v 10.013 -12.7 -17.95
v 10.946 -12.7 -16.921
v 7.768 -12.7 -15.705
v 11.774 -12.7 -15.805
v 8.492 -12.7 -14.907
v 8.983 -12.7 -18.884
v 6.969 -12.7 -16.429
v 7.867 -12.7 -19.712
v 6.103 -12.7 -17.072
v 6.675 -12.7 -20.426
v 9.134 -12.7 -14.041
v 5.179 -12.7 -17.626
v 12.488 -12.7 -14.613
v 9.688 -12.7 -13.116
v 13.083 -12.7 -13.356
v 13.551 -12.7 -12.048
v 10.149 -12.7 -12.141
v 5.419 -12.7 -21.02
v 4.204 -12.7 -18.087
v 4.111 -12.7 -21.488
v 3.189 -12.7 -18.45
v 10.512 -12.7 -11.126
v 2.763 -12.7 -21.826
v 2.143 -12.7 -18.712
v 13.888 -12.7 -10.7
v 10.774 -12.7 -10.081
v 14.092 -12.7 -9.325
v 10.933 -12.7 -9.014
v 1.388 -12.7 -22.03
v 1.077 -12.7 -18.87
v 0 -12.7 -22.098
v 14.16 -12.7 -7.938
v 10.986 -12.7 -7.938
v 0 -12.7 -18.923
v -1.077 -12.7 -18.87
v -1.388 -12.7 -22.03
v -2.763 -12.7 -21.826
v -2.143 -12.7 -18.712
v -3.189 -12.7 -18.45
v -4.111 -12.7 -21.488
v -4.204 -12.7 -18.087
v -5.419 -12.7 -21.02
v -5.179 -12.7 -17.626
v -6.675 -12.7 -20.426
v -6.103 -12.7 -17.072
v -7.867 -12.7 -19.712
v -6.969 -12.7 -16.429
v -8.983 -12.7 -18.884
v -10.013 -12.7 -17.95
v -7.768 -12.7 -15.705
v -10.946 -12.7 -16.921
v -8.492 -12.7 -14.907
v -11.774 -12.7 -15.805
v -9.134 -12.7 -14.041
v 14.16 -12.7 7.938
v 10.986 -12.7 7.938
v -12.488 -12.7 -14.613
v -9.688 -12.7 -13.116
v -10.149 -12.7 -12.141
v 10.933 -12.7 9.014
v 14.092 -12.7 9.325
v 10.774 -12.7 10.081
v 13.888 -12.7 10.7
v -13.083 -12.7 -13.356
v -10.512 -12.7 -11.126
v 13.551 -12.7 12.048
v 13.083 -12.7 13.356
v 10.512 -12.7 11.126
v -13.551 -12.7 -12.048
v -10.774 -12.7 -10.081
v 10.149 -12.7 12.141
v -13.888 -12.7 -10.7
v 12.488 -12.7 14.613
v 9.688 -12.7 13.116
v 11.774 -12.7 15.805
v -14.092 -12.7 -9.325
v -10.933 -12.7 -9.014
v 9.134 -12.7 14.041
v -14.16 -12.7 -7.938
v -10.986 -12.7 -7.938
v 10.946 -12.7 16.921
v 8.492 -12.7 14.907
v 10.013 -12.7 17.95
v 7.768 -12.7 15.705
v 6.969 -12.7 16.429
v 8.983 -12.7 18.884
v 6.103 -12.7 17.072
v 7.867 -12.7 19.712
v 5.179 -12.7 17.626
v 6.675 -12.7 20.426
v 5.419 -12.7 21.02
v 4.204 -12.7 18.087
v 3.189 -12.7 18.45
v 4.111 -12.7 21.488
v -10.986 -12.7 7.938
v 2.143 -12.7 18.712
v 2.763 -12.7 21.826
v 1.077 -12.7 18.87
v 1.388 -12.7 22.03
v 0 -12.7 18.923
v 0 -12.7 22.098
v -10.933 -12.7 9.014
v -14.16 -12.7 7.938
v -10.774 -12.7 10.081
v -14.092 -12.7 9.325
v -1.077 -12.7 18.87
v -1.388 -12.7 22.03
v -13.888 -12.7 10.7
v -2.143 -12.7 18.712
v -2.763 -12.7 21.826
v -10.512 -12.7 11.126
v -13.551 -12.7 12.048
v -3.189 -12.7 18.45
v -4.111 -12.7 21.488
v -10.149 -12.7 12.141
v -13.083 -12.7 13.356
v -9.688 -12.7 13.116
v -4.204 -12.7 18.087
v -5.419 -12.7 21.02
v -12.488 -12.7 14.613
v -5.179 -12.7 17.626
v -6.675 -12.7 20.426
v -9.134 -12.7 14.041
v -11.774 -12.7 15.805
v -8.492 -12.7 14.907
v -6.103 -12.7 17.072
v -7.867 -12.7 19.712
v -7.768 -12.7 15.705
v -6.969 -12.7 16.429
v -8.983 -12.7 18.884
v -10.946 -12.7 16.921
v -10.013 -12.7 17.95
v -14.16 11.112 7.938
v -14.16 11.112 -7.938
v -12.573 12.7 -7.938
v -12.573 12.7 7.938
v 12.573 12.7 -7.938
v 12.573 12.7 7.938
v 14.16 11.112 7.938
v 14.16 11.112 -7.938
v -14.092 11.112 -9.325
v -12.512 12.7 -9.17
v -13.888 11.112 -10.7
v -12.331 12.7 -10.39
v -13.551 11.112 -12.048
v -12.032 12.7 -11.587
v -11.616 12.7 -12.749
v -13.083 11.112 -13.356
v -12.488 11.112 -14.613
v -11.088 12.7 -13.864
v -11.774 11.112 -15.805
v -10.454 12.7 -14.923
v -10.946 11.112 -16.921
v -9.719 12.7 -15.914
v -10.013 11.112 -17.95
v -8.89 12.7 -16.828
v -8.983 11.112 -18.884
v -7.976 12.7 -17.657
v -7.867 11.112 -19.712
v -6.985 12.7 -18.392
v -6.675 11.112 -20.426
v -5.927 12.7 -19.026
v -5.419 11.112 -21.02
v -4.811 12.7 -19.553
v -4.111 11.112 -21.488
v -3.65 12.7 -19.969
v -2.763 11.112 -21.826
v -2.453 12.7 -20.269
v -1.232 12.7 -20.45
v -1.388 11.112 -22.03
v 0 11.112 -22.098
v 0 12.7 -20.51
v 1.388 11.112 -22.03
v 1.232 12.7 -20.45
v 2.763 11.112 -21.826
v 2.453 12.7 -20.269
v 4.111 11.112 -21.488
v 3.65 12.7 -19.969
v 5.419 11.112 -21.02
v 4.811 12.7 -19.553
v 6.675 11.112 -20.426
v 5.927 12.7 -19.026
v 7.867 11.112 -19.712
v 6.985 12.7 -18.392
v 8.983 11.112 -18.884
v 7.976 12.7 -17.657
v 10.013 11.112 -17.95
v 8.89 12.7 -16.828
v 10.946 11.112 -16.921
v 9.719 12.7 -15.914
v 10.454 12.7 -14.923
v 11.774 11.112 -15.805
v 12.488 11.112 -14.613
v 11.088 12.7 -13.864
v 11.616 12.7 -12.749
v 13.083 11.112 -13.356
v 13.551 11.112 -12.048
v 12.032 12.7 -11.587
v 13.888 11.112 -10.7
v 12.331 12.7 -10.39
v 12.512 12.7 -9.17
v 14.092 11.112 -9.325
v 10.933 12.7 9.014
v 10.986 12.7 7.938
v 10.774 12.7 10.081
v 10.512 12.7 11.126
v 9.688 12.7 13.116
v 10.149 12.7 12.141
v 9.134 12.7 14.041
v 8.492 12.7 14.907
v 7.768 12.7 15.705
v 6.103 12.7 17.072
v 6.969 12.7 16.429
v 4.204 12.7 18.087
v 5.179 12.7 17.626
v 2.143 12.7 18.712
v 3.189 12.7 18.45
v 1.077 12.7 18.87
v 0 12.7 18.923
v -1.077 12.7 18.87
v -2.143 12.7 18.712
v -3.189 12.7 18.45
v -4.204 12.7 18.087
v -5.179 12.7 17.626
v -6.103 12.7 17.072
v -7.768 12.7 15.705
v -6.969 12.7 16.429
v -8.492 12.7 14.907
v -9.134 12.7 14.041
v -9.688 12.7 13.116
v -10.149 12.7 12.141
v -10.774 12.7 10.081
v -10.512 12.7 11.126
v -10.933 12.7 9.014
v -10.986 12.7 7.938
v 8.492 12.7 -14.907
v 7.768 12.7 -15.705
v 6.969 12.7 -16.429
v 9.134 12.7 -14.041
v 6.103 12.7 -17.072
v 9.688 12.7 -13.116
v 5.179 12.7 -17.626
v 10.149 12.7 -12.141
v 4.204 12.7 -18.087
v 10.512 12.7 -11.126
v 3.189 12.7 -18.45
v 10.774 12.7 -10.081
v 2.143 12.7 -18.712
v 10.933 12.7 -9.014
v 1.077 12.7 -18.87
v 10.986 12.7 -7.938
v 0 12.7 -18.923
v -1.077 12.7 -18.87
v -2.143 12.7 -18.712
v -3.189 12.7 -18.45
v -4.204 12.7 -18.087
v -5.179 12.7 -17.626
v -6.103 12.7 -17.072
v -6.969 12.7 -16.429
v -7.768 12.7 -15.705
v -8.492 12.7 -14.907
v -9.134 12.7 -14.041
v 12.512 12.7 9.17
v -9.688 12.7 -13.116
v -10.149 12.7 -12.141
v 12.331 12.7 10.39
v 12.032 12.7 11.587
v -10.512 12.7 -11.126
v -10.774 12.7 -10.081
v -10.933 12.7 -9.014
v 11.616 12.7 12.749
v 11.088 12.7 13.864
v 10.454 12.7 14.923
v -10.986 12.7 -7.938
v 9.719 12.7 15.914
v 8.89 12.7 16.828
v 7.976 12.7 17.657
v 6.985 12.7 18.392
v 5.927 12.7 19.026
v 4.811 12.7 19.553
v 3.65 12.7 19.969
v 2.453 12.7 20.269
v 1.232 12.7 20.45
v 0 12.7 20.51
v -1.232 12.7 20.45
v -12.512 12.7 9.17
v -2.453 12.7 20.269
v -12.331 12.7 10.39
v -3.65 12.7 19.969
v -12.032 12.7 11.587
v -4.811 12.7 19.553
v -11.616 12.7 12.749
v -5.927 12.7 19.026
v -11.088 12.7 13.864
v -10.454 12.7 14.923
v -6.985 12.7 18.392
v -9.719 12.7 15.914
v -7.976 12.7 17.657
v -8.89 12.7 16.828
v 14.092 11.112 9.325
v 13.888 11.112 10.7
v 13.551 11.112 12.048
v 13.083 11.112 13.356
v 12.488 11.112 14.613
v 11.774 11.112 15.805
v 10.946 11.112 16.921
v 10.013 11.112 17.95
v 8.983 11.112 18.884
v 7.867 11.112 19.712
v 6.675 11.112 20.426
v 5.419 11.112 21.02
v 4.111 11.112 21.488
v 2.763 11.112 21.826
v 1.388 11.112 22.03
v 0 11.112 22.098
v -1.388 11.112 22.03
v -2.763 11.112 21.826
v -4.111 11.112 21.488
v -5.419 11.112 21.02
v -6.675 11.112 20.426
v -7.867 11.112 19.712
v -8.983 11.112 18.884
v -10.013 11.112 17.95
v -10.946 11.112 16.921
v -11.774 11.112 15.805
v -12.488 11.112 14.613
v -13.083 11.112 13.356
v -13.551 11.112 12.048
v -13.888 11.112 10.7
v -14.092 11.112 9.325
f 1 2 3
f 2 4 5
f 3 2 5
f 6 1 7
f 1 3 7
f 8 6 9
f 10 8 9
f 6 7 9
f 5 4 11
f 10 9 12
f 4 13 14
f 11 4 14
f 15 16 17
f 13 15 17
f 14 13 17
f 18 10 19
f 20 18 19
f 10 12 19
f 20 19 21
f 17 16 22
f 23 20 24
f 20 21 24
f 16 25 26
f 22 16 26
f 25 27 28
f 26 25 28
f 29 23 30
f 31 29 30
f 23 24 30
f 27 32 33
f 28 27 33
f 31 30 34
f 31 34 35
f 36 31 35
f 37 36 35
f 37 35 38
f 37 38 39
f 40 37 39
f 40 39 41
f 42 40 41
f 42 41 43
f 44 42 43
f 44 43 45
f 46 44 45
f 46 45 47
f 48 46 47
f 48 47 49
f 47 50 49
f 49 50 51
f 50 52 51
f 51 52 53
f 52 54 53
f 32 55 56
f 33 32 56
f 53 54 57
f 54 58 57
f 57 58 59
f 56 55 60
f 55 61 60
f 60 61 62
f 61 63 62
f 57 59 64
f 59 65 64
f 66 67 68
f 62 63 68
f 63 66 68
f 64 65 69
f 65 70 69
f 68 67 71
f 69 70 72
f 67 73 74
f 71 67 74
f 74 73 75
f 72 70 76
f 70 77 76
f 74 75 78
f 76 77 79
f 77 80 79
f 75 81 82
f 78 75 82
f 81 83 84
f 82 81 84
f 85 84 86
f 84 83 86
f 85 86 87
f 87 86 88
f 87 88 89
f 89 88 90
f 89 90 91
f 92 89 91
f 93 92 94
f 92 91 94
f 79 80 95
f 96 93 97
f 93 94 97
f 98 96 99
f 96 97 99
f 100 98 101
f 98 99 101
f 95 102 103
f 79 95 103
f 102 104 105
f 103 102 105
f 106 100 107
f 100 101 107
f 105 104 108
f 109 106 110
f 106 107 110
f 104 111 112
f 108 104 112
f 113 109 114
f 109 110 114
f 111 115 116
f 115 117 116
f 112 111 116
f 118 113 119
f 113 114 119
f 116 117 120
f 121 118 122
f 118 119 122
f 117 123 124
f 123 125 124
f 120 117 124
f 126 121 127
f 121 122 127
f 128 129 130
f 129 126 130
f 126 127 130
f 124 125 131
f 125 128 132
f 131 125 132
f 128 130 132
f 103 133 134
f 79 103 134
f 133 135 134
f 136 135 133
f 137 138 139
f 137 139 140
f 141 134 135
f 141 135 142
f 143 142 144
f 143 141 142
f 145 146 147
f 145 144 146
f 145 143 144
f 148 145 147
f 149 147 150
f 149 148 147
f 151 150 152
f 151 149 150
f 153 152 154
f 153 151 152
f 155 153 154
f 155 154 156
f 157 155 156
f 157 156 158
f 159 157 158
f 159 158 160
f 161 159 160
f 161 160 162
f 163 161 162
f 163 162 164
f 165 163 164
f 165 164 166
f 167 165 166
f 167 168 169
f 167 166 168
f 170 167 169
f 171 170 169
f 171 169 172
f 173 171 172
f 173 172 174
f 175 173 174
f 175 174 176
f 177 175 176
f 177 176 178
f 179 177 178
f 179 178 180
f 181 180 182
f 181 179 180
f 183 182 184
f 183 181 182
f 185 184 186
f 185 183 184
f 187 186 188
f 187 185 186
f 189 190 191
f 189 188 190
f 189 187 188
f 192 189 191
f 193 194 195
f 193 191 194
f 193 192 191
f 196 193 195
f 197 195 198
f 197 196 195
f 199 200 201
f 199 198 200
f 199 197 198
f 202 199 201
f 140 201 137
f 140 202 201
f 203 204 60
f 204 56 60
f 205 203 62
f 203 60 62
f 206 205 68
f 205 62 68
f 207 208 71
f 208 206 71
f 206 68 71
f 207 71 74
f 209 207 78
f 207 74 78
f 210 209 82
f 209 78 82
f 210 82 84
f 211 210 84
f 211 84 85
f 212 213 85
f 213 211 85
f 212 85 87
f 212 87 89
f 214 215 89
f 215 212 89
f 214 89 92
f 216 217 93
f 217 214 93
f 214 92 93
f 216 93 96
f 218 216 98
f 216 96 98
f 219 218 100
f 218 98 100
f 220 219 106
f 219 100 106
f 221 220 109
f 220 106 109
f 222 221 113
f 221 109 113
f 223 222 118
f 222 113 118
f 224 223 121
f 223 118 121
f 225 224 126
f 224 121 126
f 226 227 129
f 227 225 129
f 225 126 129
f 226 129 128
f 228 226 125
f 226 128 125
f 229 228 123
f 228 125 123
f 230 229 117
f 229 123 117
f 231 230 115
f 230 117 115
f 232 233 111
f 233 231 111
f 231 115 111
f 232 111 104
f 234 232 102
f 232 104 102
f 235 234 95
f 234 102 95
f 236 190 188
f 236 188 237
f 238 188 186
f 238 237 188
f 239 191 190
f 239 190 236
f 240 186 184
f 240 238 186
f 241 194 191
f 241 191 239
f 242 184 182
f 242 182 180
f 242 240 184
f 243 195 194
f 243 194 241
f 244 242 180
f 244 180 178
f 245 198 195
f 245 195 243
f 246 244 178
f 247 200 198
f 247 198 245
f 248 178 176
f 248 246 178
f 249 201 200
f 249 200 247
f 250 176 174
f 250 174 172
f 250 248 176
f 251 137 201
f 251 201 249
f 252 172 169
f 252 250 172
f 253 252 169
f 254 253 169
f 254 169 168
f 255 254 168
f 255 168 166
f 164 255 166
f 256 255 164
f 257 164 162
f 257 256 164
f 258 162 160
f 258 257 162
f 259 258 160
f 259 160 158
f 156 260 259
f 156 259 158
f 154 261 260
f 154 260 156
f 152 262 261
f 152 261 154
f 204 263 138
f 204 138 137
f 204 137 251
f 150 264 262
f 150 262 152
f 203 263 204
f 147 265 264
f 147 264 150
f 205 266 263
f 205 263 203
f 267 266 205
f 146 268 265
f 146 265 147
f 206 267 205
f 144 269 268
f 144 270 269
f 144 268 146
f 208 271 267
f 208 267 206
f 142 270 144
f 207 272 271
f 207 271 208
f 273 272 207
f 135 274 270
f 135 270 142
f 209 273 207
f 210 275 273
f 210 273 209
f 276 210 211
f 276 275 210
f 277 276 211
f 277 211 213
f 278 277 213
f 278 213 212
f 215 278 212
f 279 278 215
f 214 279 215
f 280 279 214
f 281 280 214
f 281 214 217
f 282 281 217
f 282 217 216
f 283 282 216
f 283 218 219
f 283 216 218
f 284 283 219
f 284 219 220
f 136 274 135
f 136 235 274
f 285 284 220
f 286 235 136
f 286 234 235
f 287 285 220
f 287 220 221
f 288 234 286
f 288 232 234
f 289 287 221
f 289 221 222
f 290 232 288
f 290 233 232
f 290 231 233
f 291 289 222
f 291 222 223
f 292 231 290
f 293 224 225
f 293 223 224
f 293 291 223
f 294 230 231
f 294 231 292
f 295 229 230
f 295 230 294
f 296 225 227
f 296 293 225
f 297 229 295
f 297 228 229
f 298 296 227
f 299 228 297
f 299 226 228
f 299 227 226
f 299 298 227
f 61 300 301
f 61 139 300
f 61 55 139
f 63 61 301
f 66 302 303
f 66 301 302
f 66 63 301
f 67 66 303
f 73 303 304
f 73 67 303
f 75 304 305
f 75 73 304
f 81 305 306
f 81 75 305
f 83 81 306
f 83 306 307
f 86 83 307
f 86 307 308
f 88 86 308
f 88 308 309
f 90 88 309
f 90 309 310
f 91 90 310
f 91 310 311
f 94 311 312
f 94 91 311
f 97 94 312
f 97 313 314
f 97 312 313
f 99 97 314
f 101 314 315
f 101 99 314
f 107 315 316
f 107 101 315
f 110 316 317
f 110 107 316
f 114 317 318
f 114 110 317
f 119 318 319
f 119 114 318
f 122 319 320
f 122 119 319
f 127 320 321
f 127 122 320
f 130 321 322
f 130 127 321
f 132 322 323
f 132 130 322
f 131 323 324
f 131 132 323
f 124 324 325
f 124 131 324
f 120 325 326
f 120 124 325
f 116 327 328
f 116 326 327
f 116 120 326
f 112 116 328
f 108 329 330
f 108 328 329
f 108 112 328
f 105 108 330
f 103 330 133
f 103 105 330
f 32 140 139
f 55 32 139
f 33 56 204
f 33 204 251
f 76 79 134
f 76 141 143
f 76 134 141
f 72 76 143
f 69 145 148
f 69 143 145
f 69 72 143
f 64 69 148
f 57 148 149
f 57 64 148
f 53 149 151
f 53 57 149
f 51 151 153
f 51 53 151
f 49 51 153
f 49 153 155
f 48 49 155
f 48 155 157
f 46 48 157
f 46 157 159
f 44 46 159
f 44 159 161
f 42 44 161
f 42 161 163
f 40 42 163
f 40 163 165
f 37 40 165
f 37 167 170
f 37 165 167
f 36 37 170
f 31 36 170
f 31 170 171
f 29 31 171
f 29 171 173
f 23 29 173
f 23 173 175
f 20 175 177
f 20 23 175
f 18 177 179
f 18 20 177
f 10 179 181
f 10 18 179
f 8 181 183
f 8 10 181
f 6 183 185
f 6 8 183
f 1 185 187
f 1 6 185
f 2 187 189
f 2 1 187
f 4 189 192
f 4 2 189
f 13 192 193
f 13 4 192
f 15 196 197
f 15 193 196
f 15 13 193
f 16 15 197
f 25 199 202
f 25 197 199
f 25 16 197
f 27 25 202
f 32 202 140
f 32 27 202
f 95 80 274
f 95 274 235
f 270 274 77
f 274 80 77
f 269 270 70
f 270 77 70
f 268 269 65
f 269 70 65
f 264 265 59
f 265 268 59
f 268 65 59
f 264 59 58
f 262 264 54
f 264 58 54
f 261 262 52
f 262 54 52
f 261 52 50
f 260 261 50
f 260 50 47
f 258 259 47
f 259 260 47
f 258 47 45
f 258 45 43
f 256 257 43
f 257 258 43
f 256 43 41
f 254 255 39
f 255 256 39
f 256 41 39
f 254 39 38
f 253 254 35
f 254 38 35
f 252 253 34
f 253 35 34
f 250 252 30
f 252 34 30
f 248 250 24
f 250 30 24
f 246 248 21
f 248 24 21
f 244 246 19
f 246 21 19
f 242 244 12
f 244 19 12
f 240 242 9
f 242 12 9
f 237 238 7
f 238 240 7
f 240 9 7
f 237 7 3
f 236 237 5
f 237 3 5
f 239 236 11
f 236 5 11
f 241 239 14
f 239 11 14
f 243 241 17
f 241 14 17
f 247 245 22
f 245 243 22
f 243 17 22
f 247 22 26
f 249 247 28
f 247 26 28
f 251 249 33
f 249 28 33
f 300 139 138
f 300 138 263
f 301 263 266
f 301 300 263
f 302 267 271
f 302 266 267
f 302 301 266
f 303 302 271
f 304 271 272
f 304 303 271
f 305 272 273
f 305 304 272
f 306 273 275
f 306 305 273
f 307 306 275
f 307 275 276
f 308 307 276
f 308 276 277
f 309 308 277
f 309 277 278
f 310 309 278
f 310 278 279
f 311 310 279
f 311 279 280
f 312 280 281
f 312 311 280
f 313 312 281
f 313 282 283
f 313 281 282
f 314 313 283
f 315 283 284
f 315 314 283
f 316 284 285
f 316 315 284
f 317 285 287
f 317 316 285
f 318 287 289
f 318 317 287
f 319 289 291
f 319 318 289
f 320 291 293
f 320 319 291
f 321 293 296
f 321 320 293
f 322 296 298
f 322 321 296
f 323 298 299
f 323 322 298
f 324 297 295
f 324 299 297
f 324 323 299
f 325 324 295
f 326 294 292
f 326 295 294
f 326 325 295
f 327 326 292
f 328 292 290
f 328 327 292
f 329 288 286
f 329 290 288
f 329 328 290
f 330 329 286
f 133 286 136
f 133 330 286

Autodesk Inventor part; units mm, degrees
ref_plane "YZ Plane" through (0, 0, 0) normal (1, 0, 0) x (0, 1, 0)
ref_plane "XZ Plane" through (0, 0, 0) normal (0, 1, 0) x (-1, 0, 0)
ref_plane "XY Plane" through (0, 0, 0) normal (0, 0, 1) x (1, 0, 0)
sketch "Sketch1" plane through (0, 0, 0) normal (0, 1, 0) x (-1, 0, 0)
  line L0 (0, -7.9375) -> (0, 7.9375) construction
  line L1 (17.4625, -7.9375) -> (17.4625, 7.9375) construction
  line L2 (-17.4625, 7.9375) -> (-17.4625, -7.9375) construction
  arc A0 (-17.4625, -7.9375) -> (17.4625, -7.9375) centre (0, -7.9375) ccw construction
  arc A1 (17.4625, 7.9375) -> (-17.4625, 7.9375) centre (0, 7.9375) ccw construction
  line L3 (14.1605, 7.9375) -> (14.1605, -7.9375)
  arc A2 (-14.1605, -7.9375) -> (14.1605, -7.9375) centre (0, -7.9375) ccw
  line L4 (-14.1605, -7.9375) -> (-14.1605, 7.9375)
  arc A3 (14.1605, 7.9375) -> (-14.1605, 7.9375) centre (0, 7.9375) ccw
  line L5 (10.9855, -7.9375) -> (10.9855, 7.9375)
  arc A4 (10.9855, 7.9375) -> (-10.9855, 7.9375) centre (0, 7.9375) ccw
  line L6 (-10.9855, 7.9375) -> (-10.9855, -7.9375)
  arc A5 (-10.9855, -7.9375) -> (10.9855, -7.9375) centre (0, -7.9375) ccw
  point P0 (0, 0)
  point P1 (0, 25.4)
  point P2 (0, -25.4)
  dimension "d1" = 34.925
  dimension "d2" = 3.302
  dimension "d3" = 50.8
  dimension "d15" = 3.175
extrude "Extrusion1" add sketch "Sketch1" along normal mid plane 25.4
chamfer "Chamfer2" distance 1.5875 angle 45 4 edges at (0, 12.7, 22.098) (14.1605, 12.7, 0) (0, 12.7, -22.098) (-14.1605, 12.7, 0)
properties part number "WL-006" material "Aluminum 6061"
